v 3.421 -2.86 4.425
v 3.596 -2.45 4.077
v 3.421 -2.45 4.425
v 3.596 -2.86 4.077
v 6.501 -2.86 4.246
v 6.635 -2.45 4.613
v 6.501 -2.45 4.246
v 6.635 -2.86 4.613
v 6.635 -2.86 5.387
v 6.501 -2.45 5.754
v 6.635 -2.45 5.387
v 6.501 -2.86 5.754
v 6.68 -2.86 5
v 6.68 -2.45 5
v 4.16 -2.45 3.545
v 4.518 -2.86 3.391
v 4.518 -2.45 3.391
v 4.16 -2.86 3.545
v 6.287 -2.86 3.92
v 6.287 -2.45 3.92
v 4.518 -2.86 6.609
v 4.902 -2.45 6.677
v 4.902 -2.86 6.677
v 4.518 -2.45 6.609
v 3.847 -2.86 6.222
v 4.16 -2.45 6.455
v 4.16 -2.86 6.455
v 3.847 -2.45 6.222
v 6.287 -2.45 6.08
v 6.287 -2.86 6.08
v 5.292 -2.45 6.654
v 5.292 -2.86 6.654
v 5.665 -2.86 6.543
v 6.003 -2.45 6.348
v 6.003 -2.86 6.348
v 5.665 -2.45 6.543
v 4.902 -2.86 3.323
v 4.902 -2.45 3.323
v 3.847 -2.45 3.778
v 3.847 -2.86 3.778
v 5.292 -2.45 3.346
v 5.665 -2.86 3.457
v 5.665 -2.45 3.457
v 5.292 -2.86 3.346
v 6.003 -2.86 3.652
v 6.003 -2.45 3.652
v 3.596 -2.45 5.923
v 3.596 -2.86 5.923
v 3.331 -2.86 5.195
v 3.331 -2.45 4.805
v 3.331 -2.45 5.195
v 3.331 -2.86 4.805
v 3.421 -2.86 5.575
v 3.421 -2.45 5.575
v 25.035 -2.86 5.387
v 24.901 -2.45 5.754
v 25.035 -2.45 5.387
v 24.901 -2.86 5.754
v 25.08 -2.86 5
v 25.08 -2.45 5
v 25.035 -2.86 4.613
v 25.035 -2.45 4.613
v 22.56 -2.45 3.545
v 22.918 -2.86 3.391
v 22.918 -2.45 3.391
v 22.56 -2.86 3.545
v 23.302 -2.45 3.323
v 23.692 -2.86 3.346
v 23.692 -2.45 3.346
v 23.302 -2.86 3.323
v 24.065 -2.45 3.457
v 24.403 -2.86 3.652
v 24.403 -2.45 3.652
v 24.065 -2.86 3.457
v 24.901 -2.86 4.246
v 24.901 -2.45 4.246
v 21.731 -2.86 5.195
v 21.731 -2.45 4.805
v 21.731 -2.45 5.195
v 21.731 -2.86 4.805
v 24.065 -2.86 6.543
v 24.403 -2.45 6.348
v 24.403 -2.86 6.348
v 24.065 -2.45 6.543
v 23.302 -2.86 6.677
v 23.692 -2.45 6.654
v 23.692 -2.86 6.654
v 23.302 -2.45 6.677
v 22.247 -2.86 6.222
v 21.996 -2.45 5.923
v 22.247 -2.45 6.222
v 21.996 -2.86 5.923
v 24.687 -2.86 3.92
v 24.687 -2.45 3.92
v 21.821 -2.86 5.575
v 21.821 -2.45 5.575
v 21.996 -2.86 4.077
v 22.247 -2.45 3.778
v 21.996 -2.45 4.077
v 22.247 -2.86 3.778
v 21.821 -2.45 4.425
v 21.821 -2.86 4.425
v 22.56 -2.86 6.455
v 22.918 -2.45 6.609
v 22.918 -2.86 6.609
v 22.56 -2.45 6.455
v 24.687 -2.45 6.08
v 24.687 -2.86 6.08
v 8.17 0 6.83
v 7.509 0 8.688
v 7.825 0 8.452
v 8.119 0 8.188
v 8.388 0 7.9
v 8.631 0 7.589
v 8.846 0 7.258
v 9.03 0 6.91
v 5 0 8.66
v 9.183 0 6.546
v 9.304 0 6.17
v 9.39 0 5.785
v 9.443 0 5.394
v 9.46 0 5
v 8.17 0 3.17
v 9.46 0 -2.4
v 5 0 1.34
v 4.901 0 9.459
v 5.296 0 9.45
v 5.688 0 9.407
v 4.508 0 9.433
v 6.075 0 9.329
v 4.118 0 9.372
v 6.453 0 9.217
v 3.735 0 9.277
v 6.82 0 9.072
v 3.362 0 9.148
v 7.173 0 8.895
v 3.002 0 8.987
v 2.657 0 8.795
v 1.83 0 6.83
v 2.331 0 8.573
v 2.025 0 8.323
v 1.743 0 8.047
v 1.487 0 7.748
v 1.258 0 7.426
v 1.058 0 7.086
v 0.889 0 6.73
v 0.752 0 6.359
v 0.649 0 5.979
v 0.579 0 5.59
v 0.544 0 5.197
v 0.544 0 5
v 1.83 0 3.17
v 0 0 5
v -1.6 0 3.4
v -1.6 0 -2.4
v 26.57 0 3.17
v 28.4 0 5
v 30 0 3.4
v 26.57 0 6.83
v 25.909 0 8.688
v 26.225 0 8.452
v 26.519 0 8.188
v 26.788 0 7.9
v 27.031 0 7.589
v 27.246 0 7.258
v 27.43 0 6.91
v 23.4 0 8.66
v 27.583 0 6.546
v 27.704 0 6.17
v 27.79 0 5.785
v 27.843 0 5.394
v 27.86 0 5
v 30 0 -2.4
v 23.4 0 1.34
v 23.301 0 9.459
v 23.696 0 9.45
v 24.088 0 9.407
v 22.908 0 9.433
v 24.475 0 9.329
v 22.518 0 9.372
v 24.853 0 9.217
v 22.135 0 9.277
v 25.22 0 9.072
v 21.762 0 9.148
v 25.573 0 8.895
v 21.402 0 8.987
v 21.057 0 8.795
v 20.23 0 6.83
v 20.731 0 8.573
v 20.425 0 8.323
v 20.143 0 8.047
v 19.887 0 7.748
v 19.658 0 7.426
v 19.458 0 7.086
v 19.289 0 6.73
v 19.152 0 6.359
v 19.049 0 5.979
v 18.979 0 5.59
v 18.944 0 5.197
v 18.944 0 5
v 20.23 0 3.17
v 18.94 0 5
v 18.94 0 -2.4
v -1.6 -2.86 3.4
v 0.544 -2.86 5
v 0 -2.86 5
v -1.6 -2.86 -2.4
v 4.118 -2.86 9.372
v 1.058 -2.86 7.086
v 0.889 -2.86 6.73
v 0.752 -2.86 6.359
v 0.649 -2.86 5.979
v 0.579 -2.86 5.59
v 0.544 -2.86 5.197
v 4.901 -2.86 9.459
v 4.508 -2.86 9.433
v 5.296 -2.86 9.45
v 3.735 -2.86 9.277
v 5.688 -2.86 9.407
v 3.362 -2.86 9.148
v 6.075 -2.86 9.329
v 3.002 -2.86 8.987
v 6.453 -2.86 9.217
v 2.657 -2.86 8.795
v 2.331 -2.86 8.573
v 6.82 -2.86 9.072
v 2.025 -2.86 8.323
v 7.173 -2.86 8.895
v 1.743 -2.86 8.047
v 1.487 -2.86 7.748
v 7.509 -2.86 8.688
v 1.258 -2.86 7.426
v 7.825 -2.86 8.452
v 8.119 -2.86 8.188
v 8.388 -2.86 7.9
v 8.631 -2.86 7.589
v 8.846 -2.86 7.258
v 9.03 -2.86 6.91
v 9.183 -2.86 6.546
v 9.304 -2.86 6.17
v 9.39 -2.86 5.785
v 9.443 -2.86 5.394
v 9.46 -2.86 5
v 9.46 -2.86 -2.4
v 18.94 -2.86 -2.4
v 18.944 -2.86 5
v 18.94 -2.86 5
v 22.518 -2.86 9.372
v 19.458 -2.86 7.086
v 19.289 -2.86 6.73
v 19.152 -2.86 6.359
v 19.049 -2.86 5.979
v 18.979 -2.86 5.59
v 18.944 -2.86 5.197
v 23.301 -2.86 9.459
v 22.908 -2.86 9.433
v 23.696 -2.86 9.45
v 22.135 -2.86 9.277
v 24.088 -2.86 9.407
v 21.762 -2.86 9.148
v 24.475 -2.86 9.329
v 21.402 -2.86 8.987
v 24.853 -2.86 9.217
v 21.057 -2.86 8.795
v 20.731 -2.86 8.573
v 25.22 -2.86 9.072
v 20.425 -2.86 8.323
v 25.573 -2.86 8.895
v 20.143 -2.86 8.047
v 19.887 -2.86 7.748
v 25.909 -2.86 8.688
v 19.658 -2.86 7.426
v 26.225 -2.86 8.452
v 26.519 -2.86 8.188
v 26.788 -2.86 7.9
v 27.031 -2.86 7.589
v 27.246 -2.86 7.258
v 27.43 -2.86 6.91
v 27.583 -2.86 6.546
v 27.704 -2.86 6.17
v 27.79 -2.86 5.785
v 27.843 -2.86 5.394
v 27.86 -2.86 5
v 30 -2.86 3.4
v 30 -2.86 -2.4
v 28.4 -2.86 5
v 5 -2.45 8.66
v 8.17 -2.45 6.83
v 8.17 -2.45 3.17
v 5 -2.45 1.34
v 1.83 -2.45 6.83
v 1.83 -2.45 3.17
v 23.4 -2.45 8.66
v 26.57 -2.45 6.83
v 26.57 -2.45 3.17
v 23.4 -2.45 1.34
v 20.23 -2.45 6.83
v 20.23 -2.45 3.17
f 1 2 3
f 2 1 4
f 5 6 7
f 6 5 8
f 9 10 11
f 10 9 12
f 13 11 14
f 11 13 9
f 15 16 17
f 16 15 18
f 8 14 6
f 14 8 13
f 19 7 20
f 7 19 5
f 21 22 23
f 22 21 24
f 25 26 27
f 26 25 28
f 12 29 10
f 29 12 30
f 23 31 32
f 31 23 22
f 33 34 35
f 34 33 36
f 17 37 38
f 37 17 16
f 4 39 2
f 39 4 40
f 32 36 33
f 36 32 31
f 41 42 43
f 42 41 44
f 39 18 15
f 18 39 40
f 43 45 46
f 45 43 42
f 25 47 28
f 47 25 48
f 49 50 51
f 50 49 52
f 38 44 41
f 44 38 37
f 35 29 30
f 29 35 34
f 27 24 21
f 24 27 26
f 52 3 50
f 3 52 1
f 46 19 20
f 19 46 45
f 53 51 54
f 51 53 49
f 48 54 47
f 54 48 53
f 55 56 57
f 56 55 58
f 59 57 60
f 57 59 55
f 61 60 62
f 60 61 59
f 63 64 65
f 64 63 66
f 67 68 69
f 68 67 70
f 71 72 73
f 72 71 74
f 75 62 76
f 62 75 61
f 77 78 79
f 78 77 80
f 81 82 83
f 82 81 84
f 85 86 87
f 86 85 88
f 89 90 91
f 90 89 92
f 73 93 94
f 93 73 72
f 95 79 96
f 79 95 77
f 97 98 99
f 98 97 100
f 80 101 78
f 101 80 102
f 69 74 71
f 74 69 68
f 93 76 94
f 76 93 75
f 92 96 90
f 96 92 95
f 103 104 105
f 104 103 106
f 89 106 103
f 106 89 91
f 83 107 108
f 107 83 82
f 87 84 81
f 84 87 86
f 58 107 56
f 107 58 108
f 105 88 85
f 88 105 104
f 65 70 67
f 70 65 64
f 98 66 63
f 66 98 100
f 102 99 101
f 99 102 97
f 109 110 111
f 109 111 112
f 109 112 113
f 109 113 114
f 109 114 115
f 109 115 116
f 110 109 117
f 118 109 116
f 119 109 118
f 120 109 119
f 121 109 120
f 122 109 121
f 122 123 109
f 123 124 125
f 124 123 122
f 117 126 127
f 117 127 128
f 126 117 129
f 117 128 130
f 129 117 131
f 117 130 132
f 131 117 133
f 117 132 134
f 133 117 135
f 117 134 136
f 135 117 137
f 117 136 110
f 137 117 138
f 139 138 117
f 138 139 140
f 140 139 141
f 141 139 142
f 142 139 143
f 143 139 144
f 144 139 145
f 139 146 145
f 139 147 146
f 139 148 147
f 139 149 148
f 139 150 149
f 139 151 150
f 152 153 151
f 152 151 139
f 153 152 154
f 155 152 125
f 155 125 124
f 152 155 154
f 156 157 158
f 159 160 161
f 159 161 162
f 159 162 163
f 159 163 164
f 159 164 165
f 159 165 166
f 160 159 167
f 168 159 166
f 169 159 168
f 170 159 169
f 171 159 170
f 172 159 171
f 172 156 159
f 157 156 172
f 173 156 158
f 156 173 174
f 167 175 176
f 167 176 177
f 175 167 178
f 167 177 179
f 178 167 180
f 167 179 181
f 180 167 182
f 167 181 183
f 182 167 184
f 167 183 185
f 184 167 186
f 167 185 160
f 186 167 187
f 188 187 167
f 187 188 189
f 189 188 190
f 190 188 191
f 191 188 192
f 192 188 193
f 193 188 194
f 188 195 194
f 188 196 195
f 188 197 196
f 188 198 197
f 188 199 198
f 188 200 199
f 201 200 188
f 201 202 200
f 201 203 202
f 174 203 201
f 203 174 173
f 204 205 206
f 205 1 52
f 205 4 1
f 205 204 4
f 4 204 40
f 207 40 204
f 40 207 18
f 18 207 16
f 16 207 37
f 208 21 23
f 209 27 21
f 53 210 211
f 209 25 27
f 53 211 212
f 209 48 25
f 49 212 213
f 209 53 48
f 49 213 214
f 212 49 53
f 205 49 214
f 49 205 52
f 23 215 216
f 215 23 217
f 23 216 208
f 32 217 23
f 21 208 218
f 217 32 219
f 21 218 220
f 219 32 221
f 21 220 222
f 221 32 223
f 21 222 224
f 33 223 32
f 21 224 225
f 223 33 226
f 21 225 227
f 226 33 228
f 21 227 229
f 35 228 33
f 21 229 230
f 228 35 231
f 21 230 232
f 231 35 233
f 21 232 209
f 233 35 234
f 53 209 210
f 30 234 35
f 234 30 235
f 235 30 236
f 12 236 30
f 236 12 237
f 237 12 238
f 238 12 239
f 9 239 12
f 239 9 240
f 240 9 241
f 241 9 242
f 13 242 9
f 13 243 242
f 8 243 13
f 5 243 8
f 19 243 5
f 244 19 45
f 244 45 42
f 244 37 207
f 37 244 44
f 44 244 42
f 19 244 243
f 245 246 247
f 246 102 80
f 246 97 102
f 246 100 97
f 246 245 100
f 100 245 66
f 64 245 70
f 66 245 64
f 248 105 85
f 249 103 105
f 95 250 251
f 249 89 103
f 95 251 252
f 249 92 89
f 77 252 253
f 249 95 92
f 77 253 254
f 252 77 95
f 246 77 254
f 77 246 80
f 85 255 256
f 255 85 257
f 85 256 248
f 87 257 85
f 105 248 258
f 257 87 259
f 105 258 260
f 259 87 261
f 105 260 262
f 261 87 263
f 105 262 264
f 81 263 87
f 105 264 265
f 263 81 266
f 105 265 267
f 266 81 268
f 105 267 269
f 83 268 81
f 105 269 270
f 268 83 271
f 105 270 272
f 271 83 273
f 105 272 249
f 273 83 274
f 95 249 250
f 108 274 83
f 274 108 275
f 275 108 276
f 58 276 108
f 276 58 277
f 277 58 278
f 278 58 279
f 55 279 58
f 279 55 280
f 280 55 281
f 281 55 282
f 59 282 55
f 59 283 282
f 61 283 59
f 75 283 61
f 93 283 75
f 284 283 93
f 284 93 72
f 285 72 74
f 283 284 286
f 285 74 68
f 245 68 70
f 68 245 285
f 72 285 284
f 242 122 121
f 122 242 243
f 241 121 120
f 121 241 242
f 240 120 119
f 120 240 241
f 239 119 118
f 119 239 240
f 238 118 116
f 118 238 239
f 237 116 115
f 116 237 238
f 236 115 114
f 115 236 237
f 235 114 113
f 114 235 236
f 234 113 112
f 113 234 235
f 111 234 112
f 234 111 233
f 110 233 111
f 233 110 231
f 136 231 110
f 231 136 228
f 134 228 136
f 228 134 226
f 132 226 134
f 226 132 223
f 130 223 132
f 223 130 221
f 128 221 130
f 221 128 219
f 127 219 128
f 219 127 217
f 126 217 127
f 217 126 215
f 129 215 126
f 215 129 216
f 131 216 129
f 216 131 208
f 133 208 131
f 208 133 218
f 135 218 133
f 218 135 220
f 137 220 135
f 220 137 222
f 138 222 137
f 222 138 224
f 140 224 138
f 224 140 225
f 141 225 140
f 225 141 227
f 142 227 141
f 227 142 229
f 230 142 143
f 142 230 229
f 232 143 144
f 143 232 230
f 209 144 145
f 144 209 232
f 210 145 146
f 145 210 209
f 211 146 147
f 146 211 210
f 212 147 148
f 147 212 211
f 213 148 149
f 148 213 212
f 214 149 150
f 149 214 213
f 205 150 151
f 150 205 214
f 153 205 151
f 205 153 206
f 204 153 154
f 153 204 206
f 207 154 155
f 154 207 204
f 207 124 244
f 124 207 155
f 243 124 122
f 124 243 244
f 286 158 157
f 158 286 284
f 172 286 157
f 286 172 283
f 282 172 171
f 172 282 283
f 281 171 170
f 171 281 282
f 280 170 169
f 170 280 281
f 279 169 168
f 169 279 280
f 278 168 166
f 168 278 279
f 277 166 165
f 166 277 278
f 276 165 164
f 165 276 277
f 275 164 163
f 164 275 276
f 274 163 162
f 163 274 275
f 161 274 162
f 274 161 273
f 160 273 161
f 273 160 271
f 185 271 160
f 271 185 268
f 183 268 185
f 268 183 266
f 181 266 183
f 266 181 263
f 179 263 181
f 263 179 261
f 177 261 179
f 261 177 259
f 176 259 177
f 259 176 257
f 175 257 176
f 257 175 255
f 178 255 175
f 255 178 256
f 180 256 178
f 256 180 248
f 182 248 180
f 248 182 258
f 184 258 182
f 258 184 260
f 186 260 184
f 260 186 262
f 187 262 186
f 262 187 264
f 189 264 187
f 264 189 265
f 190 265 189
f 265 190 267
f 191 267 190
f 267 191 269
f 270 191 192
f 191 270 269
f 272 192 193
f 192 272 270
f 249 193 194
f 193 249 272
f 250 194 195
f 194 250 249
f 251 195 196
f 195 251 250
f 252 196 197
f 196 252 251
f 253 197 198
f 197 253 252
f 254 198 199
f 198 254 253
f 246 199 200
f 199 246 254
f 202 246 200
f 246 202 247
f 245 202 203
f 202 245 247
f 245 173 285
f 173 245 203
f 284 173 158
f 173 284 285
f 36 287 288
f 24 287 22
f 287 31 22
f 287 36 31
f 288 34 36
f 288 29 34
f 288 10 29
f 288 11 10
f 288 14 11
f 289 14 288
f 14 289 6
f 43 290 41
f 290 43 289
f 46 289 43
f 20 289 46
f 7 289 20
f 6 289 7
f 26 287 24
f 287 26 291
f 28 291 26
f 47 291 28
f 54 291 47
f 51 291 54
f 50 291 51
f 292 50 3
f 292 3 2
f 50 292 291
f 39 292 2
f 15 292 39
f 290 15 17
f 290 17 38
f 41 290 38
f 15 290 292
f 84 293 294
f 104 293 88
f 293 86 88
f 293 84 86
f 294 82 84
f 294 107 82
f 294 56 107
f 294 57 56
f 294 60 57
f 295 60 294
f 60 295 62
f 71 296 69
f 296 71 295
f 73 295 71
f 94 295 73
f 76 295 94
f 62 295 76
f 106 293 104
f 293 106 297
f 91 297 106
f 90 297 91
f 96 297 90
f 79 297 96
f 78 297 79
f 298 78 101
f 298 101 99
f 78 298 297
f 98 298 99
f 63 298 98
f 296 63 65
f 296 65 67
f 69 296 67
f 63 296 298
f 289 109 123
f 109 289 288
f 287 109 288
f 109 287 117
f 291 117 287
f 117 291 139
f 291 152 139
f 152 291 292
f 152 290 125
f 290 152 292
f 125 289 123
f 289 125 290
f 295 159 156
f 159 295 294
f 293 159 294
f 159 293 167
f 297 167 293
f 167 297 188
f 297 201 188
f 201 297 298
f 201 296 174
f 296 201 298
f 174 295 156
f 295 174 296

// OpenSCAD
// Copyright (C) 2025 Arif K. Rafiq
// This program is free software: you can redistribute it and/or modify
// it under the terms of the GNU General Public License as published by
// the Free Software Foundation, either version 3 of the License, or
// (at your option) any later version.

// This program is distributed in the hope that it will be useful,
// but WITHOUT ANY WARRANTY; without even the implied warranty of
// MERCHANTABILITY or FITNESS FOR A PARTICULAR PURPOSE.  See the
// GNU General Public License for more details.

// You should have received a copy of the GNU General Public License
// along with this file.  If not, see <https://www.gnu.org/licenses/>,
// or write to: license@temperedoptimism.com


/* 
(b)readth       :(w)est (X-)   (c)enter (X0) (e)east (X+)
(h)eight        :(d)own (Z-)   (g)round(Z0)  (u)p (Z+)

Vectors (v)     :(x), (y), (z)
Thicknesses (t) : Thicknesses to resolve 3D printer limits or rendering issues.
Proportion (p)  : container for grouping (r)adius and (i)ntensity into a singl 2d vector acccessed using .x and .y respectively
*/
/* 17:08 */
// Fixed in example3.scad       // Set limits in customizer
/* [Thicknesses (x),(y),(z)] */
tFitGap = [0.16, 0.16, 0.16];   //[0.00:0.01:0.64] 
tWallMin = [0.40, 0.40, 0.16];  //[0.16:0.08:1.60] 
/* [Proportional (x):(Radius, (y):(i)ntensity] */
pHexSink = [3.5, 2.3];          //[0.10:0.02:20.00] 
pFastShaft = [1.36, 5.80]; //0.10:0.02:20.00]
pWashSink = [4.00, 1.00]; //0.10:0.02:20.00]
/* [2D vectors (x), (y)] */
vTerminalW = [5.0, 5.0];        //[0.00:0.10:100] 
vTerminalE = [23.4, 5.0];       //[0.00:0.10:100] 
/* [Scalars] */
leadingEdge = 2.4; //[0.8:0.4:5.0]
flankEdge = 1.6; //[0.8:0.4:5.0]
bBoard = 28.4; //[20:0.1:100.0]
hBoard = 1.6; //0.8:04:3.2]
/* [Special ] */
fa0 = 4.0;     //[1:1:60]  
fs0 = 0.4;     //[0.1:0.1:4.0]  
fx0 = 3;       //[1,2,3,4,5,6,7,8,9,10]
rCorner = 1.6; //0.1
/* [Hidden] */ 
tEps=0.01; 

/* Calucualted at run time. */
pHexSurround = [pHexSink.x + (tWallMin.x * 2) + tFitGap.x, pHexSink.y + tWallMin.y + tFitGap.y];

//30.00-35.00 Circles, Also look at the customizer!!
// Rotate
rotate([90,0,0]){
  difference(){

    linear_extrude(pHexSurround.y, convexity=fx0){ 
      polygon([[vTerminalW.x + pHexSurround.x, vTerminalW.y],
              [ vTerminalW.x + pHexSurround.x, -leadingEdge],
              [-flankEdge, -leadingEdge],
              [-flankEdge, vTerminalW.y - rCorner],
              [-flankEdge + rCorner, vTerminalW.y]]);
      polygon([[vTerminalE.x - pHexSurround.x, vTerminalE.y],
              [ vTerminalE.x - pHexSurround.x, -leadingEdge],
              [bBoard + flankEdge, -leadingEdge],
              [bBoard + flankEdge, vTerminalE.y - rCorner],
              [bBoard + flankEdge - rCorner, vTerminalE.y]]);       
              
      for(v = [vTerminalW, vTerminalE]){
        translate(v)  circle(pHexSurround.x, $fa=fa0, $fs=fs0 );
      }
    }
    //hex pocket
    // Solve Conflicting bodies
    // This could be a loop see: 16:05 in the Video:
    //  https://www.youtube.com/watch?v=R-gRqGRss1k   
    translate([0,0, -tEps]) linear_extrude(pHexSink.y + tFitGap.y, convexity=fx0){
      translate(vTerminalW)  rotate([0,0,30]) circle(pHexSink.x + tFitGap.y, $fn=6);
      translate(vTerminalE)  rotate([0,0,30]) circle(pHexSink.x + tFitGap.y, $fn=6);
    }
    // fastner hole
    for(v = [vTerminalW, vTerminalE]){
        #translate([v.x, v.y, -hBoard -pWashSink.y]) cylinder(pFastShaft.y + tFitGap.y, r=pFastShaft.x + (tFitGap.x * 2), $fa=fa0, $fs=fs0);
    }
  }
}
